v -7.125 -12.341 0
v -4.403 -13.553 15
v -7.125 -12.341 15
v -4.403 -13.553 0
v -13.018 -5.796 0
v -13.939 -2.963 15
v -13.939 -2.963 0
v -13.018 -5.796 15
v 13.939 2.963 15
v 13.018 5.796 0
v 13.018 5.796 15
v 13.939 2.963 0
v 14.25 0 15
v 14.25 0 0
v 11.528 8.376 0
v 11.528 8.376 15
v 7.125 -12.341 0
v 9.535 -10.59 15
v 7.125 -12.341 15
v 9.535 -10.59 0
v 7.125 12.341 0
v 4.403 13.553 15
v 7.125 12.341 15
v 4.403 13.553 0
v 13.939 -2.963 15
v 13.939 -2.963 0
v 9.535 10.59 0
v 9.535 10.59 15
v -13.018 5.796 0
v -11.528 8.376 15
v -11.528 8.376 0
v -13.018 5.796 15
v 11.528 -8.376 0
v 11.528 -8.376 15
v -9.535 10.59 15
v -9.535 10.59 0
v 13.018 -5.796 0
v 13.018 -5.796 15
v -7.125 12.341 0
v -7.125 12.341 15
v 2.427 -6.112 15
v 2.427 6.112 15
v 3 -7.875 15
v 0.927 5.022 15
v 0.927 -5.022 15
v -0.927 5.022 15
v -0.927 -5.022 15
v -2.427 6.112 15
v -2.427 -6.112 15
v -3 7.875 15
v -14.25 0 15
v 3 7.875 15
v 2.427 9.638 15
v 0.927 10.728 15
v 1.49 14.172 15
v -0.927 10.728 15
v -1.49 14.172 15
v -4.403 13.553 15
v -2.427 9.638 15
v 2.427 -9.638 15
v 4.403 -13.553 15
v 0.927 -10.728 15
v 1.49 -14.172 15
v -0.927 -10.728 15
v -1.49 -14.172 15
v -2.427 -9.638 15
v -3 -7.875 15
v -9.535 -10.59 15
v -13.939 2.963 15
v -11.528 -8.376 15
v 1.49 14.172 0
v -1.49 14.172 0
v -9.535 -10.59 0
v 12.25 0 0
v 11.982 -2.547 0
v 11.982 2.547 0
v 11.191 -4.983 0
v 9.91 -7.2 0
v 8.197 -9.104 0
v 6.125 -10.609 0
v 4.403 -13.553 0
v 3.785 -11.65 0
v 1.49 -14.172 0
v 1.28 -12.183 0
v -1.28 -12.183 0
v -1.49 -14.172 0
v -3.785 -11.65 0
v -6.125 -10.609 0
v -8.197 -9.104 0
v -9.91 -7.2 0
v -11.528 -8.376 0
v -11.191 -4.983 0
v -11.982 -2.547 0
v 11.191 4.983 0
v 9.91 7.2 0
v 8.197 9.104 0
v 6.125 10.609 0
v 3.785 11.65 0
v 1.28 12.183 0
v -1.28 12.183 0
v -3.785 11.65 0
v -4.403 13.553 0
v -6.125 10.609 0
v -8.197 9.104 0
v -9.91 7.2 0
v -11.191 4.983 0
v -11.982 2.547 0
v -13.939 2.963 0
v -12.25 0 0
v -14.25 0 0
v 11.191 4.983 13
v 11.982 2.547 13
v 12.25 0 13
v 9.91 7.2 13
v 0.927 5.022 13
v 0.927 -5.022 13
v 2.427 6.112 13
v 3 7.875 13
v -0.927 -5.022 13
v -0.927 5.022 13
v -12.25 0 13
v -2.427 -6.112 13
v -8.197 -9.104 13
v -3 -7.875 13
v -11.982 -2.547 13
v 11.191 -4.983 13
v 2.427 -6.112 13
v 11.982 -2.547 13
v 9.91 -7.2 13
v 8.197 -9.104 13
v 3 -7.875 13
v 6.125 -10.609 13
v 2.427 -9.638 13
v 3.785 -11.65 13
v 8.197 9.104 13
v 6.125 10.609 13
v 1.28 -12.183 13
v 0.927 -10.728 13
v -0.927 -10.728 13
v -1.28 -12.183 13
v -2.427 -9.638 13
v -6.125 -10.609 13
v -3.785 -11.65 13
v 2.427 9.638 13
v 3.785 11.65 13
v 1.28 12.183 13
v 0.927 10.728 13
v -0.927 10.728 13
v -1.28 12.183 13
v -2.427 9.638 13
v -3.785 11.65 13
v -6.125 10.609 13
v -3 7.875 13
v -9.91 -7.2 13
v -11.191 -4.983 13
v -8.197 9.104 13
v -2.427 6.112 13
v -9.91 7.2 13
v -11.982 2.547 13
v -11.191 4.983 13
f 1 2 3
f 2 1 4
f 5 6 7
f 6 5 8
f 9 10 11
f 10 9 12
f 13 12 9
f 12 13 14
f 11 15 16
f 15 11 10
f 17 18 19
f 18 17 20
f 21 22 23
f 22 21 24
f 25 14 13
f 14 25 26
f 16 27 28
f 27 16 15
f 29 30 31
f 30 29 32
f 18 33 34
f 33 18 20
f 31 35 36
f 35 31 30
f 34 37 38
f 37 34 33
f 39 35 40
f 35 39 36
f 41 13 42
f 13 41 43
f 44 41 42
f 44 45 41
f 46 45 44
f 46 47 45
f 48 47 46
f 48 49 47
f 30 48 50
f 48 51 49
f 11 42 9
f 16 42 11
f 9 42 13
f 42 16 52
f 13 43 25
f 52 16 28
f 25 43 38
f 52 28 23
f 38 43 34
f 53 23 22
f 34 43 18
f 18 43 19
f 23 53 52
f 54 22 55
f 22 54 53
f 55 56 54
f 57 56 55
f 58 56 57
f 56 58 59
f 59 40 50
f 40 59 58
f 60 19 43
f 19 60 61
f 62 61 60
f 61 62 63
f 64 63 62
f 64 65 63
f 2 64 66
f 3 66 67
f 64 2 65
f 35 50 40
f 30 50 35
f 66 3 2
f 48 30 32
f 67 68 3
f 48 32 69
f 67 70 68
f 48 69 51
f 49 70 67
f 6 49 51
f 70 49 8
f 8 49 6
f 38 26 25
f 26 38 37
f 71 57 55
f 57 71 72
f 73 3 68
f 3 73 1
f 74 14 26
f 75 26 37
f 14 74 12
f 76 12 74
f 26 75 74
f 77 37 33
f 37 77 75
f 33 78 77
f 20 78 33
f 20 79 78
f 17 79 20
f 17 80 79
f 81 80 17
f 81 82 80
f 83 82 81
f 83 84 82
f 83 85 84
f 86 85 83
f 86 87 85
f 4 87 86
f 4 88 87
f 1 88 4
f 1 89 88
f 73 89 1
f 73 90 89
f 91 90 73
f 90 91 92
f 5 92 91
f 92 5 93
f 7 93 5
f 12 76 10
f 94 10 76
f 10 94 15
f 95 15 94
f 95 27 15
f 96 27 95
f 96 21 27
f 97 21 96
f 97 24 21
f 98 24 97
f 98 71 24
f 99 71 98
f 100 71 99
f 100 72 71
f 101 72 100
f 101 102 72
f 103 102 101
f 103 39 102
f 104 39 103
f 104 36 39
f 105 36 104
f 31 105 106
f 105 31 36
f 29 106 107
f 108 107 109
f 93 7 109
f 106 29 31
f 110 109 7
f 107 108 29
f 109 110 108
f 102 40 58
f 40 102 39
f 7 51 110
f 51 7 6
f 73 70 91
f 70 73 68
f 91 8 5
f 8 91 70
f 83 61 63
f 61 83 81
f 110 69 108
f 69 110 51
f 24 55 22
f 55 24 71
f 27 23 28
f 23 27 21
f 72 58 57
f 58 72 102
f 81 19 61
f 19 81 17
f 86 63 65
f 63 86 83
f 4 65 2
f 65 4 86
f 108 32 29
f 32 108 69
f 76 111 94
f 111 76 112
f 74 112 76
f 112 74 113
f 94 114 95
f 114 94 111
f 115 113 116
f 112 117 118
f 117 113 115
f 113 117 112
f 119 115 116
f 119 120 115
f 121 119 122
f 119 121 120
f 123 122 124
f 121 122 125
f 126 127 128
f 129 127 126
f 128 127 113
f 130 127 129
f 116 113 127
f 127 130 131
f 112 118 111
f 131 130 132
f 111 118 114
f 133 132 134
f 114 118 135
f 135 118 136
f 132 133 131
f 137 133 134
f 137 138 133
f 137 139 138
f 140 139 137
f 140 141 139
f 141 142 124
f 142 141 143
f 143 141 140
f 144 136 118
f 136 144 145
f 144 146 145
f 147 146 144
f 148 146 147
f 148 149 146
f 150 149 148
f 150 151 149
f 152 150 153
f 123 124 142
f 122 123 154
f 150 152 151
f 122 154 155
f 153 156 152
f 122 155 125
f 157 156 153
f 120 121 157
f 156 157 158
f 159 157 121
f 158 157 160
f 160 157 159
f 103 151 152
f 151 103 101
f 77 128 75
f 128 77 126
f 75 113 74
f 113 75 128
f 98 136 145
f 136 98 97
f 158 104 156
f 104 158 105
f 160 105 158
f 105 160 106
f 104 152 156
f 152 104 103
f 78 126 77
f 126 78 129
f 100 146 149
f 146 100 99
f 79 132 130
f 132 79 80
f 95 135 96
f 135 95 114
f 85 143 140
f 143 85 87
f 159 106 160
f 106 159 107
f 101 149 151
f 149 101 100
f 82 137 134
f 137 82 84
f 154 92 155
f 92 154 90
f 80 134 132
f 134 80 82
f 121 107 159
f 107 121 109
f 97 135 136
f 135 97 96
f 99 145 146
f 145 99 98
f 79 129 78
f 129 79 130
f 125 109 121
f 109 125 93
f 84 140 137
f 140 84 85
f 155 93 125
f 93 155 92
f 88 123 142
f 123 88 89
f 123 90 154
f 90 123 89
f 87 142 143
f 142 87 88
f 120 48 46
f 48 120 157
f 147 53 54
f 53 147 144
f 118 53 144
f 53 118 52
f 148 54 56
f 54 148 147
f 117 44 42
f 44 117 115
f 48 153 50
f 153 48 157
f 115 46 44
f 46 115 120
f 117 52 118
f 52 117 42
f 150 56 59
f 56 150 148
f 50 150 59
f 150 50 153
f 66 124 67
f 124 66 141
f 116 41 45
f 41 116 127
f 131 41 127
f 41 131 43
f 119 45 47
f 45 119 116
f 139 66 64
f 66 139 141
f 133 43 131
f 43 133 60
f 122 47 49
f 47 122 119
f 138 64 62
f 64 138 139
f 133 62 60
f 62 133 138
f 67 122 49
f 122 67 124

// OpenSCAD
// [FL_INDEX: keywords="openscad, 3d_parametric, Parametric_motor_case_maker, csg_solid" | COT="Parametric OpenSCAD design from 3DCodeverse"]
// Title: Parametric motor case maker

// This is a parametric case maker for a motor

//Example1

// to make a custom case, replace the parameters with your own

//examplemotor1
dm = 24.5; // Diameter of motor
th = 2; // Thickness of case
hc = 13; // Height of motor
he =  dm/2; // Height to ends
de = 2; // Diameter of ends
dbe = 15.75; // Distance between ends
le = 2.5; // Length of ends
dte = le/2; // Distance to ends

//Example2

//to use, get rid of "/*" and "*/"

/*//examplemotor2
dm = 18; // Diameter of motor
th = 2; // Thickness of case
hc = 28; // Height of motor
he =  19; // Height to ends
de = 4; // Diameter of ends
dbe = 12.5; // Distance between ends
le = 5; // Length of ends
dte = 7; // Distance to ends*/



//program
if (le-dte >0)
{
difference() {
cylinder(r = (dm/2+th), h = (hc+th));
cylinder(r = (dm/2), h = hc);
translate([dm/2-he,dbe/2,hc-dte/2])
cylinder(r = (de/2)+th, h = le+2 * th, center = true);
translate([dm/2-he,-dbe/2,hc-dte/2])
cylinder(r = (de/2)+th, h = le+2 * th, center = true);
}
}
else
{
difference() {
cylinder(r = (dm/2+th), h = (hc+th));
cylinder(r = (dm/2), h = hc);
translate([dm/2-he,dbe/2,hc-dte/2])
cylinder(r = (de/2)+th, h = le, center = true);
translate([dm/2-he,-dbe/2,hc-dte/2])
cylinder(r = (de/2)+th, h = le, center = true);
}
}
